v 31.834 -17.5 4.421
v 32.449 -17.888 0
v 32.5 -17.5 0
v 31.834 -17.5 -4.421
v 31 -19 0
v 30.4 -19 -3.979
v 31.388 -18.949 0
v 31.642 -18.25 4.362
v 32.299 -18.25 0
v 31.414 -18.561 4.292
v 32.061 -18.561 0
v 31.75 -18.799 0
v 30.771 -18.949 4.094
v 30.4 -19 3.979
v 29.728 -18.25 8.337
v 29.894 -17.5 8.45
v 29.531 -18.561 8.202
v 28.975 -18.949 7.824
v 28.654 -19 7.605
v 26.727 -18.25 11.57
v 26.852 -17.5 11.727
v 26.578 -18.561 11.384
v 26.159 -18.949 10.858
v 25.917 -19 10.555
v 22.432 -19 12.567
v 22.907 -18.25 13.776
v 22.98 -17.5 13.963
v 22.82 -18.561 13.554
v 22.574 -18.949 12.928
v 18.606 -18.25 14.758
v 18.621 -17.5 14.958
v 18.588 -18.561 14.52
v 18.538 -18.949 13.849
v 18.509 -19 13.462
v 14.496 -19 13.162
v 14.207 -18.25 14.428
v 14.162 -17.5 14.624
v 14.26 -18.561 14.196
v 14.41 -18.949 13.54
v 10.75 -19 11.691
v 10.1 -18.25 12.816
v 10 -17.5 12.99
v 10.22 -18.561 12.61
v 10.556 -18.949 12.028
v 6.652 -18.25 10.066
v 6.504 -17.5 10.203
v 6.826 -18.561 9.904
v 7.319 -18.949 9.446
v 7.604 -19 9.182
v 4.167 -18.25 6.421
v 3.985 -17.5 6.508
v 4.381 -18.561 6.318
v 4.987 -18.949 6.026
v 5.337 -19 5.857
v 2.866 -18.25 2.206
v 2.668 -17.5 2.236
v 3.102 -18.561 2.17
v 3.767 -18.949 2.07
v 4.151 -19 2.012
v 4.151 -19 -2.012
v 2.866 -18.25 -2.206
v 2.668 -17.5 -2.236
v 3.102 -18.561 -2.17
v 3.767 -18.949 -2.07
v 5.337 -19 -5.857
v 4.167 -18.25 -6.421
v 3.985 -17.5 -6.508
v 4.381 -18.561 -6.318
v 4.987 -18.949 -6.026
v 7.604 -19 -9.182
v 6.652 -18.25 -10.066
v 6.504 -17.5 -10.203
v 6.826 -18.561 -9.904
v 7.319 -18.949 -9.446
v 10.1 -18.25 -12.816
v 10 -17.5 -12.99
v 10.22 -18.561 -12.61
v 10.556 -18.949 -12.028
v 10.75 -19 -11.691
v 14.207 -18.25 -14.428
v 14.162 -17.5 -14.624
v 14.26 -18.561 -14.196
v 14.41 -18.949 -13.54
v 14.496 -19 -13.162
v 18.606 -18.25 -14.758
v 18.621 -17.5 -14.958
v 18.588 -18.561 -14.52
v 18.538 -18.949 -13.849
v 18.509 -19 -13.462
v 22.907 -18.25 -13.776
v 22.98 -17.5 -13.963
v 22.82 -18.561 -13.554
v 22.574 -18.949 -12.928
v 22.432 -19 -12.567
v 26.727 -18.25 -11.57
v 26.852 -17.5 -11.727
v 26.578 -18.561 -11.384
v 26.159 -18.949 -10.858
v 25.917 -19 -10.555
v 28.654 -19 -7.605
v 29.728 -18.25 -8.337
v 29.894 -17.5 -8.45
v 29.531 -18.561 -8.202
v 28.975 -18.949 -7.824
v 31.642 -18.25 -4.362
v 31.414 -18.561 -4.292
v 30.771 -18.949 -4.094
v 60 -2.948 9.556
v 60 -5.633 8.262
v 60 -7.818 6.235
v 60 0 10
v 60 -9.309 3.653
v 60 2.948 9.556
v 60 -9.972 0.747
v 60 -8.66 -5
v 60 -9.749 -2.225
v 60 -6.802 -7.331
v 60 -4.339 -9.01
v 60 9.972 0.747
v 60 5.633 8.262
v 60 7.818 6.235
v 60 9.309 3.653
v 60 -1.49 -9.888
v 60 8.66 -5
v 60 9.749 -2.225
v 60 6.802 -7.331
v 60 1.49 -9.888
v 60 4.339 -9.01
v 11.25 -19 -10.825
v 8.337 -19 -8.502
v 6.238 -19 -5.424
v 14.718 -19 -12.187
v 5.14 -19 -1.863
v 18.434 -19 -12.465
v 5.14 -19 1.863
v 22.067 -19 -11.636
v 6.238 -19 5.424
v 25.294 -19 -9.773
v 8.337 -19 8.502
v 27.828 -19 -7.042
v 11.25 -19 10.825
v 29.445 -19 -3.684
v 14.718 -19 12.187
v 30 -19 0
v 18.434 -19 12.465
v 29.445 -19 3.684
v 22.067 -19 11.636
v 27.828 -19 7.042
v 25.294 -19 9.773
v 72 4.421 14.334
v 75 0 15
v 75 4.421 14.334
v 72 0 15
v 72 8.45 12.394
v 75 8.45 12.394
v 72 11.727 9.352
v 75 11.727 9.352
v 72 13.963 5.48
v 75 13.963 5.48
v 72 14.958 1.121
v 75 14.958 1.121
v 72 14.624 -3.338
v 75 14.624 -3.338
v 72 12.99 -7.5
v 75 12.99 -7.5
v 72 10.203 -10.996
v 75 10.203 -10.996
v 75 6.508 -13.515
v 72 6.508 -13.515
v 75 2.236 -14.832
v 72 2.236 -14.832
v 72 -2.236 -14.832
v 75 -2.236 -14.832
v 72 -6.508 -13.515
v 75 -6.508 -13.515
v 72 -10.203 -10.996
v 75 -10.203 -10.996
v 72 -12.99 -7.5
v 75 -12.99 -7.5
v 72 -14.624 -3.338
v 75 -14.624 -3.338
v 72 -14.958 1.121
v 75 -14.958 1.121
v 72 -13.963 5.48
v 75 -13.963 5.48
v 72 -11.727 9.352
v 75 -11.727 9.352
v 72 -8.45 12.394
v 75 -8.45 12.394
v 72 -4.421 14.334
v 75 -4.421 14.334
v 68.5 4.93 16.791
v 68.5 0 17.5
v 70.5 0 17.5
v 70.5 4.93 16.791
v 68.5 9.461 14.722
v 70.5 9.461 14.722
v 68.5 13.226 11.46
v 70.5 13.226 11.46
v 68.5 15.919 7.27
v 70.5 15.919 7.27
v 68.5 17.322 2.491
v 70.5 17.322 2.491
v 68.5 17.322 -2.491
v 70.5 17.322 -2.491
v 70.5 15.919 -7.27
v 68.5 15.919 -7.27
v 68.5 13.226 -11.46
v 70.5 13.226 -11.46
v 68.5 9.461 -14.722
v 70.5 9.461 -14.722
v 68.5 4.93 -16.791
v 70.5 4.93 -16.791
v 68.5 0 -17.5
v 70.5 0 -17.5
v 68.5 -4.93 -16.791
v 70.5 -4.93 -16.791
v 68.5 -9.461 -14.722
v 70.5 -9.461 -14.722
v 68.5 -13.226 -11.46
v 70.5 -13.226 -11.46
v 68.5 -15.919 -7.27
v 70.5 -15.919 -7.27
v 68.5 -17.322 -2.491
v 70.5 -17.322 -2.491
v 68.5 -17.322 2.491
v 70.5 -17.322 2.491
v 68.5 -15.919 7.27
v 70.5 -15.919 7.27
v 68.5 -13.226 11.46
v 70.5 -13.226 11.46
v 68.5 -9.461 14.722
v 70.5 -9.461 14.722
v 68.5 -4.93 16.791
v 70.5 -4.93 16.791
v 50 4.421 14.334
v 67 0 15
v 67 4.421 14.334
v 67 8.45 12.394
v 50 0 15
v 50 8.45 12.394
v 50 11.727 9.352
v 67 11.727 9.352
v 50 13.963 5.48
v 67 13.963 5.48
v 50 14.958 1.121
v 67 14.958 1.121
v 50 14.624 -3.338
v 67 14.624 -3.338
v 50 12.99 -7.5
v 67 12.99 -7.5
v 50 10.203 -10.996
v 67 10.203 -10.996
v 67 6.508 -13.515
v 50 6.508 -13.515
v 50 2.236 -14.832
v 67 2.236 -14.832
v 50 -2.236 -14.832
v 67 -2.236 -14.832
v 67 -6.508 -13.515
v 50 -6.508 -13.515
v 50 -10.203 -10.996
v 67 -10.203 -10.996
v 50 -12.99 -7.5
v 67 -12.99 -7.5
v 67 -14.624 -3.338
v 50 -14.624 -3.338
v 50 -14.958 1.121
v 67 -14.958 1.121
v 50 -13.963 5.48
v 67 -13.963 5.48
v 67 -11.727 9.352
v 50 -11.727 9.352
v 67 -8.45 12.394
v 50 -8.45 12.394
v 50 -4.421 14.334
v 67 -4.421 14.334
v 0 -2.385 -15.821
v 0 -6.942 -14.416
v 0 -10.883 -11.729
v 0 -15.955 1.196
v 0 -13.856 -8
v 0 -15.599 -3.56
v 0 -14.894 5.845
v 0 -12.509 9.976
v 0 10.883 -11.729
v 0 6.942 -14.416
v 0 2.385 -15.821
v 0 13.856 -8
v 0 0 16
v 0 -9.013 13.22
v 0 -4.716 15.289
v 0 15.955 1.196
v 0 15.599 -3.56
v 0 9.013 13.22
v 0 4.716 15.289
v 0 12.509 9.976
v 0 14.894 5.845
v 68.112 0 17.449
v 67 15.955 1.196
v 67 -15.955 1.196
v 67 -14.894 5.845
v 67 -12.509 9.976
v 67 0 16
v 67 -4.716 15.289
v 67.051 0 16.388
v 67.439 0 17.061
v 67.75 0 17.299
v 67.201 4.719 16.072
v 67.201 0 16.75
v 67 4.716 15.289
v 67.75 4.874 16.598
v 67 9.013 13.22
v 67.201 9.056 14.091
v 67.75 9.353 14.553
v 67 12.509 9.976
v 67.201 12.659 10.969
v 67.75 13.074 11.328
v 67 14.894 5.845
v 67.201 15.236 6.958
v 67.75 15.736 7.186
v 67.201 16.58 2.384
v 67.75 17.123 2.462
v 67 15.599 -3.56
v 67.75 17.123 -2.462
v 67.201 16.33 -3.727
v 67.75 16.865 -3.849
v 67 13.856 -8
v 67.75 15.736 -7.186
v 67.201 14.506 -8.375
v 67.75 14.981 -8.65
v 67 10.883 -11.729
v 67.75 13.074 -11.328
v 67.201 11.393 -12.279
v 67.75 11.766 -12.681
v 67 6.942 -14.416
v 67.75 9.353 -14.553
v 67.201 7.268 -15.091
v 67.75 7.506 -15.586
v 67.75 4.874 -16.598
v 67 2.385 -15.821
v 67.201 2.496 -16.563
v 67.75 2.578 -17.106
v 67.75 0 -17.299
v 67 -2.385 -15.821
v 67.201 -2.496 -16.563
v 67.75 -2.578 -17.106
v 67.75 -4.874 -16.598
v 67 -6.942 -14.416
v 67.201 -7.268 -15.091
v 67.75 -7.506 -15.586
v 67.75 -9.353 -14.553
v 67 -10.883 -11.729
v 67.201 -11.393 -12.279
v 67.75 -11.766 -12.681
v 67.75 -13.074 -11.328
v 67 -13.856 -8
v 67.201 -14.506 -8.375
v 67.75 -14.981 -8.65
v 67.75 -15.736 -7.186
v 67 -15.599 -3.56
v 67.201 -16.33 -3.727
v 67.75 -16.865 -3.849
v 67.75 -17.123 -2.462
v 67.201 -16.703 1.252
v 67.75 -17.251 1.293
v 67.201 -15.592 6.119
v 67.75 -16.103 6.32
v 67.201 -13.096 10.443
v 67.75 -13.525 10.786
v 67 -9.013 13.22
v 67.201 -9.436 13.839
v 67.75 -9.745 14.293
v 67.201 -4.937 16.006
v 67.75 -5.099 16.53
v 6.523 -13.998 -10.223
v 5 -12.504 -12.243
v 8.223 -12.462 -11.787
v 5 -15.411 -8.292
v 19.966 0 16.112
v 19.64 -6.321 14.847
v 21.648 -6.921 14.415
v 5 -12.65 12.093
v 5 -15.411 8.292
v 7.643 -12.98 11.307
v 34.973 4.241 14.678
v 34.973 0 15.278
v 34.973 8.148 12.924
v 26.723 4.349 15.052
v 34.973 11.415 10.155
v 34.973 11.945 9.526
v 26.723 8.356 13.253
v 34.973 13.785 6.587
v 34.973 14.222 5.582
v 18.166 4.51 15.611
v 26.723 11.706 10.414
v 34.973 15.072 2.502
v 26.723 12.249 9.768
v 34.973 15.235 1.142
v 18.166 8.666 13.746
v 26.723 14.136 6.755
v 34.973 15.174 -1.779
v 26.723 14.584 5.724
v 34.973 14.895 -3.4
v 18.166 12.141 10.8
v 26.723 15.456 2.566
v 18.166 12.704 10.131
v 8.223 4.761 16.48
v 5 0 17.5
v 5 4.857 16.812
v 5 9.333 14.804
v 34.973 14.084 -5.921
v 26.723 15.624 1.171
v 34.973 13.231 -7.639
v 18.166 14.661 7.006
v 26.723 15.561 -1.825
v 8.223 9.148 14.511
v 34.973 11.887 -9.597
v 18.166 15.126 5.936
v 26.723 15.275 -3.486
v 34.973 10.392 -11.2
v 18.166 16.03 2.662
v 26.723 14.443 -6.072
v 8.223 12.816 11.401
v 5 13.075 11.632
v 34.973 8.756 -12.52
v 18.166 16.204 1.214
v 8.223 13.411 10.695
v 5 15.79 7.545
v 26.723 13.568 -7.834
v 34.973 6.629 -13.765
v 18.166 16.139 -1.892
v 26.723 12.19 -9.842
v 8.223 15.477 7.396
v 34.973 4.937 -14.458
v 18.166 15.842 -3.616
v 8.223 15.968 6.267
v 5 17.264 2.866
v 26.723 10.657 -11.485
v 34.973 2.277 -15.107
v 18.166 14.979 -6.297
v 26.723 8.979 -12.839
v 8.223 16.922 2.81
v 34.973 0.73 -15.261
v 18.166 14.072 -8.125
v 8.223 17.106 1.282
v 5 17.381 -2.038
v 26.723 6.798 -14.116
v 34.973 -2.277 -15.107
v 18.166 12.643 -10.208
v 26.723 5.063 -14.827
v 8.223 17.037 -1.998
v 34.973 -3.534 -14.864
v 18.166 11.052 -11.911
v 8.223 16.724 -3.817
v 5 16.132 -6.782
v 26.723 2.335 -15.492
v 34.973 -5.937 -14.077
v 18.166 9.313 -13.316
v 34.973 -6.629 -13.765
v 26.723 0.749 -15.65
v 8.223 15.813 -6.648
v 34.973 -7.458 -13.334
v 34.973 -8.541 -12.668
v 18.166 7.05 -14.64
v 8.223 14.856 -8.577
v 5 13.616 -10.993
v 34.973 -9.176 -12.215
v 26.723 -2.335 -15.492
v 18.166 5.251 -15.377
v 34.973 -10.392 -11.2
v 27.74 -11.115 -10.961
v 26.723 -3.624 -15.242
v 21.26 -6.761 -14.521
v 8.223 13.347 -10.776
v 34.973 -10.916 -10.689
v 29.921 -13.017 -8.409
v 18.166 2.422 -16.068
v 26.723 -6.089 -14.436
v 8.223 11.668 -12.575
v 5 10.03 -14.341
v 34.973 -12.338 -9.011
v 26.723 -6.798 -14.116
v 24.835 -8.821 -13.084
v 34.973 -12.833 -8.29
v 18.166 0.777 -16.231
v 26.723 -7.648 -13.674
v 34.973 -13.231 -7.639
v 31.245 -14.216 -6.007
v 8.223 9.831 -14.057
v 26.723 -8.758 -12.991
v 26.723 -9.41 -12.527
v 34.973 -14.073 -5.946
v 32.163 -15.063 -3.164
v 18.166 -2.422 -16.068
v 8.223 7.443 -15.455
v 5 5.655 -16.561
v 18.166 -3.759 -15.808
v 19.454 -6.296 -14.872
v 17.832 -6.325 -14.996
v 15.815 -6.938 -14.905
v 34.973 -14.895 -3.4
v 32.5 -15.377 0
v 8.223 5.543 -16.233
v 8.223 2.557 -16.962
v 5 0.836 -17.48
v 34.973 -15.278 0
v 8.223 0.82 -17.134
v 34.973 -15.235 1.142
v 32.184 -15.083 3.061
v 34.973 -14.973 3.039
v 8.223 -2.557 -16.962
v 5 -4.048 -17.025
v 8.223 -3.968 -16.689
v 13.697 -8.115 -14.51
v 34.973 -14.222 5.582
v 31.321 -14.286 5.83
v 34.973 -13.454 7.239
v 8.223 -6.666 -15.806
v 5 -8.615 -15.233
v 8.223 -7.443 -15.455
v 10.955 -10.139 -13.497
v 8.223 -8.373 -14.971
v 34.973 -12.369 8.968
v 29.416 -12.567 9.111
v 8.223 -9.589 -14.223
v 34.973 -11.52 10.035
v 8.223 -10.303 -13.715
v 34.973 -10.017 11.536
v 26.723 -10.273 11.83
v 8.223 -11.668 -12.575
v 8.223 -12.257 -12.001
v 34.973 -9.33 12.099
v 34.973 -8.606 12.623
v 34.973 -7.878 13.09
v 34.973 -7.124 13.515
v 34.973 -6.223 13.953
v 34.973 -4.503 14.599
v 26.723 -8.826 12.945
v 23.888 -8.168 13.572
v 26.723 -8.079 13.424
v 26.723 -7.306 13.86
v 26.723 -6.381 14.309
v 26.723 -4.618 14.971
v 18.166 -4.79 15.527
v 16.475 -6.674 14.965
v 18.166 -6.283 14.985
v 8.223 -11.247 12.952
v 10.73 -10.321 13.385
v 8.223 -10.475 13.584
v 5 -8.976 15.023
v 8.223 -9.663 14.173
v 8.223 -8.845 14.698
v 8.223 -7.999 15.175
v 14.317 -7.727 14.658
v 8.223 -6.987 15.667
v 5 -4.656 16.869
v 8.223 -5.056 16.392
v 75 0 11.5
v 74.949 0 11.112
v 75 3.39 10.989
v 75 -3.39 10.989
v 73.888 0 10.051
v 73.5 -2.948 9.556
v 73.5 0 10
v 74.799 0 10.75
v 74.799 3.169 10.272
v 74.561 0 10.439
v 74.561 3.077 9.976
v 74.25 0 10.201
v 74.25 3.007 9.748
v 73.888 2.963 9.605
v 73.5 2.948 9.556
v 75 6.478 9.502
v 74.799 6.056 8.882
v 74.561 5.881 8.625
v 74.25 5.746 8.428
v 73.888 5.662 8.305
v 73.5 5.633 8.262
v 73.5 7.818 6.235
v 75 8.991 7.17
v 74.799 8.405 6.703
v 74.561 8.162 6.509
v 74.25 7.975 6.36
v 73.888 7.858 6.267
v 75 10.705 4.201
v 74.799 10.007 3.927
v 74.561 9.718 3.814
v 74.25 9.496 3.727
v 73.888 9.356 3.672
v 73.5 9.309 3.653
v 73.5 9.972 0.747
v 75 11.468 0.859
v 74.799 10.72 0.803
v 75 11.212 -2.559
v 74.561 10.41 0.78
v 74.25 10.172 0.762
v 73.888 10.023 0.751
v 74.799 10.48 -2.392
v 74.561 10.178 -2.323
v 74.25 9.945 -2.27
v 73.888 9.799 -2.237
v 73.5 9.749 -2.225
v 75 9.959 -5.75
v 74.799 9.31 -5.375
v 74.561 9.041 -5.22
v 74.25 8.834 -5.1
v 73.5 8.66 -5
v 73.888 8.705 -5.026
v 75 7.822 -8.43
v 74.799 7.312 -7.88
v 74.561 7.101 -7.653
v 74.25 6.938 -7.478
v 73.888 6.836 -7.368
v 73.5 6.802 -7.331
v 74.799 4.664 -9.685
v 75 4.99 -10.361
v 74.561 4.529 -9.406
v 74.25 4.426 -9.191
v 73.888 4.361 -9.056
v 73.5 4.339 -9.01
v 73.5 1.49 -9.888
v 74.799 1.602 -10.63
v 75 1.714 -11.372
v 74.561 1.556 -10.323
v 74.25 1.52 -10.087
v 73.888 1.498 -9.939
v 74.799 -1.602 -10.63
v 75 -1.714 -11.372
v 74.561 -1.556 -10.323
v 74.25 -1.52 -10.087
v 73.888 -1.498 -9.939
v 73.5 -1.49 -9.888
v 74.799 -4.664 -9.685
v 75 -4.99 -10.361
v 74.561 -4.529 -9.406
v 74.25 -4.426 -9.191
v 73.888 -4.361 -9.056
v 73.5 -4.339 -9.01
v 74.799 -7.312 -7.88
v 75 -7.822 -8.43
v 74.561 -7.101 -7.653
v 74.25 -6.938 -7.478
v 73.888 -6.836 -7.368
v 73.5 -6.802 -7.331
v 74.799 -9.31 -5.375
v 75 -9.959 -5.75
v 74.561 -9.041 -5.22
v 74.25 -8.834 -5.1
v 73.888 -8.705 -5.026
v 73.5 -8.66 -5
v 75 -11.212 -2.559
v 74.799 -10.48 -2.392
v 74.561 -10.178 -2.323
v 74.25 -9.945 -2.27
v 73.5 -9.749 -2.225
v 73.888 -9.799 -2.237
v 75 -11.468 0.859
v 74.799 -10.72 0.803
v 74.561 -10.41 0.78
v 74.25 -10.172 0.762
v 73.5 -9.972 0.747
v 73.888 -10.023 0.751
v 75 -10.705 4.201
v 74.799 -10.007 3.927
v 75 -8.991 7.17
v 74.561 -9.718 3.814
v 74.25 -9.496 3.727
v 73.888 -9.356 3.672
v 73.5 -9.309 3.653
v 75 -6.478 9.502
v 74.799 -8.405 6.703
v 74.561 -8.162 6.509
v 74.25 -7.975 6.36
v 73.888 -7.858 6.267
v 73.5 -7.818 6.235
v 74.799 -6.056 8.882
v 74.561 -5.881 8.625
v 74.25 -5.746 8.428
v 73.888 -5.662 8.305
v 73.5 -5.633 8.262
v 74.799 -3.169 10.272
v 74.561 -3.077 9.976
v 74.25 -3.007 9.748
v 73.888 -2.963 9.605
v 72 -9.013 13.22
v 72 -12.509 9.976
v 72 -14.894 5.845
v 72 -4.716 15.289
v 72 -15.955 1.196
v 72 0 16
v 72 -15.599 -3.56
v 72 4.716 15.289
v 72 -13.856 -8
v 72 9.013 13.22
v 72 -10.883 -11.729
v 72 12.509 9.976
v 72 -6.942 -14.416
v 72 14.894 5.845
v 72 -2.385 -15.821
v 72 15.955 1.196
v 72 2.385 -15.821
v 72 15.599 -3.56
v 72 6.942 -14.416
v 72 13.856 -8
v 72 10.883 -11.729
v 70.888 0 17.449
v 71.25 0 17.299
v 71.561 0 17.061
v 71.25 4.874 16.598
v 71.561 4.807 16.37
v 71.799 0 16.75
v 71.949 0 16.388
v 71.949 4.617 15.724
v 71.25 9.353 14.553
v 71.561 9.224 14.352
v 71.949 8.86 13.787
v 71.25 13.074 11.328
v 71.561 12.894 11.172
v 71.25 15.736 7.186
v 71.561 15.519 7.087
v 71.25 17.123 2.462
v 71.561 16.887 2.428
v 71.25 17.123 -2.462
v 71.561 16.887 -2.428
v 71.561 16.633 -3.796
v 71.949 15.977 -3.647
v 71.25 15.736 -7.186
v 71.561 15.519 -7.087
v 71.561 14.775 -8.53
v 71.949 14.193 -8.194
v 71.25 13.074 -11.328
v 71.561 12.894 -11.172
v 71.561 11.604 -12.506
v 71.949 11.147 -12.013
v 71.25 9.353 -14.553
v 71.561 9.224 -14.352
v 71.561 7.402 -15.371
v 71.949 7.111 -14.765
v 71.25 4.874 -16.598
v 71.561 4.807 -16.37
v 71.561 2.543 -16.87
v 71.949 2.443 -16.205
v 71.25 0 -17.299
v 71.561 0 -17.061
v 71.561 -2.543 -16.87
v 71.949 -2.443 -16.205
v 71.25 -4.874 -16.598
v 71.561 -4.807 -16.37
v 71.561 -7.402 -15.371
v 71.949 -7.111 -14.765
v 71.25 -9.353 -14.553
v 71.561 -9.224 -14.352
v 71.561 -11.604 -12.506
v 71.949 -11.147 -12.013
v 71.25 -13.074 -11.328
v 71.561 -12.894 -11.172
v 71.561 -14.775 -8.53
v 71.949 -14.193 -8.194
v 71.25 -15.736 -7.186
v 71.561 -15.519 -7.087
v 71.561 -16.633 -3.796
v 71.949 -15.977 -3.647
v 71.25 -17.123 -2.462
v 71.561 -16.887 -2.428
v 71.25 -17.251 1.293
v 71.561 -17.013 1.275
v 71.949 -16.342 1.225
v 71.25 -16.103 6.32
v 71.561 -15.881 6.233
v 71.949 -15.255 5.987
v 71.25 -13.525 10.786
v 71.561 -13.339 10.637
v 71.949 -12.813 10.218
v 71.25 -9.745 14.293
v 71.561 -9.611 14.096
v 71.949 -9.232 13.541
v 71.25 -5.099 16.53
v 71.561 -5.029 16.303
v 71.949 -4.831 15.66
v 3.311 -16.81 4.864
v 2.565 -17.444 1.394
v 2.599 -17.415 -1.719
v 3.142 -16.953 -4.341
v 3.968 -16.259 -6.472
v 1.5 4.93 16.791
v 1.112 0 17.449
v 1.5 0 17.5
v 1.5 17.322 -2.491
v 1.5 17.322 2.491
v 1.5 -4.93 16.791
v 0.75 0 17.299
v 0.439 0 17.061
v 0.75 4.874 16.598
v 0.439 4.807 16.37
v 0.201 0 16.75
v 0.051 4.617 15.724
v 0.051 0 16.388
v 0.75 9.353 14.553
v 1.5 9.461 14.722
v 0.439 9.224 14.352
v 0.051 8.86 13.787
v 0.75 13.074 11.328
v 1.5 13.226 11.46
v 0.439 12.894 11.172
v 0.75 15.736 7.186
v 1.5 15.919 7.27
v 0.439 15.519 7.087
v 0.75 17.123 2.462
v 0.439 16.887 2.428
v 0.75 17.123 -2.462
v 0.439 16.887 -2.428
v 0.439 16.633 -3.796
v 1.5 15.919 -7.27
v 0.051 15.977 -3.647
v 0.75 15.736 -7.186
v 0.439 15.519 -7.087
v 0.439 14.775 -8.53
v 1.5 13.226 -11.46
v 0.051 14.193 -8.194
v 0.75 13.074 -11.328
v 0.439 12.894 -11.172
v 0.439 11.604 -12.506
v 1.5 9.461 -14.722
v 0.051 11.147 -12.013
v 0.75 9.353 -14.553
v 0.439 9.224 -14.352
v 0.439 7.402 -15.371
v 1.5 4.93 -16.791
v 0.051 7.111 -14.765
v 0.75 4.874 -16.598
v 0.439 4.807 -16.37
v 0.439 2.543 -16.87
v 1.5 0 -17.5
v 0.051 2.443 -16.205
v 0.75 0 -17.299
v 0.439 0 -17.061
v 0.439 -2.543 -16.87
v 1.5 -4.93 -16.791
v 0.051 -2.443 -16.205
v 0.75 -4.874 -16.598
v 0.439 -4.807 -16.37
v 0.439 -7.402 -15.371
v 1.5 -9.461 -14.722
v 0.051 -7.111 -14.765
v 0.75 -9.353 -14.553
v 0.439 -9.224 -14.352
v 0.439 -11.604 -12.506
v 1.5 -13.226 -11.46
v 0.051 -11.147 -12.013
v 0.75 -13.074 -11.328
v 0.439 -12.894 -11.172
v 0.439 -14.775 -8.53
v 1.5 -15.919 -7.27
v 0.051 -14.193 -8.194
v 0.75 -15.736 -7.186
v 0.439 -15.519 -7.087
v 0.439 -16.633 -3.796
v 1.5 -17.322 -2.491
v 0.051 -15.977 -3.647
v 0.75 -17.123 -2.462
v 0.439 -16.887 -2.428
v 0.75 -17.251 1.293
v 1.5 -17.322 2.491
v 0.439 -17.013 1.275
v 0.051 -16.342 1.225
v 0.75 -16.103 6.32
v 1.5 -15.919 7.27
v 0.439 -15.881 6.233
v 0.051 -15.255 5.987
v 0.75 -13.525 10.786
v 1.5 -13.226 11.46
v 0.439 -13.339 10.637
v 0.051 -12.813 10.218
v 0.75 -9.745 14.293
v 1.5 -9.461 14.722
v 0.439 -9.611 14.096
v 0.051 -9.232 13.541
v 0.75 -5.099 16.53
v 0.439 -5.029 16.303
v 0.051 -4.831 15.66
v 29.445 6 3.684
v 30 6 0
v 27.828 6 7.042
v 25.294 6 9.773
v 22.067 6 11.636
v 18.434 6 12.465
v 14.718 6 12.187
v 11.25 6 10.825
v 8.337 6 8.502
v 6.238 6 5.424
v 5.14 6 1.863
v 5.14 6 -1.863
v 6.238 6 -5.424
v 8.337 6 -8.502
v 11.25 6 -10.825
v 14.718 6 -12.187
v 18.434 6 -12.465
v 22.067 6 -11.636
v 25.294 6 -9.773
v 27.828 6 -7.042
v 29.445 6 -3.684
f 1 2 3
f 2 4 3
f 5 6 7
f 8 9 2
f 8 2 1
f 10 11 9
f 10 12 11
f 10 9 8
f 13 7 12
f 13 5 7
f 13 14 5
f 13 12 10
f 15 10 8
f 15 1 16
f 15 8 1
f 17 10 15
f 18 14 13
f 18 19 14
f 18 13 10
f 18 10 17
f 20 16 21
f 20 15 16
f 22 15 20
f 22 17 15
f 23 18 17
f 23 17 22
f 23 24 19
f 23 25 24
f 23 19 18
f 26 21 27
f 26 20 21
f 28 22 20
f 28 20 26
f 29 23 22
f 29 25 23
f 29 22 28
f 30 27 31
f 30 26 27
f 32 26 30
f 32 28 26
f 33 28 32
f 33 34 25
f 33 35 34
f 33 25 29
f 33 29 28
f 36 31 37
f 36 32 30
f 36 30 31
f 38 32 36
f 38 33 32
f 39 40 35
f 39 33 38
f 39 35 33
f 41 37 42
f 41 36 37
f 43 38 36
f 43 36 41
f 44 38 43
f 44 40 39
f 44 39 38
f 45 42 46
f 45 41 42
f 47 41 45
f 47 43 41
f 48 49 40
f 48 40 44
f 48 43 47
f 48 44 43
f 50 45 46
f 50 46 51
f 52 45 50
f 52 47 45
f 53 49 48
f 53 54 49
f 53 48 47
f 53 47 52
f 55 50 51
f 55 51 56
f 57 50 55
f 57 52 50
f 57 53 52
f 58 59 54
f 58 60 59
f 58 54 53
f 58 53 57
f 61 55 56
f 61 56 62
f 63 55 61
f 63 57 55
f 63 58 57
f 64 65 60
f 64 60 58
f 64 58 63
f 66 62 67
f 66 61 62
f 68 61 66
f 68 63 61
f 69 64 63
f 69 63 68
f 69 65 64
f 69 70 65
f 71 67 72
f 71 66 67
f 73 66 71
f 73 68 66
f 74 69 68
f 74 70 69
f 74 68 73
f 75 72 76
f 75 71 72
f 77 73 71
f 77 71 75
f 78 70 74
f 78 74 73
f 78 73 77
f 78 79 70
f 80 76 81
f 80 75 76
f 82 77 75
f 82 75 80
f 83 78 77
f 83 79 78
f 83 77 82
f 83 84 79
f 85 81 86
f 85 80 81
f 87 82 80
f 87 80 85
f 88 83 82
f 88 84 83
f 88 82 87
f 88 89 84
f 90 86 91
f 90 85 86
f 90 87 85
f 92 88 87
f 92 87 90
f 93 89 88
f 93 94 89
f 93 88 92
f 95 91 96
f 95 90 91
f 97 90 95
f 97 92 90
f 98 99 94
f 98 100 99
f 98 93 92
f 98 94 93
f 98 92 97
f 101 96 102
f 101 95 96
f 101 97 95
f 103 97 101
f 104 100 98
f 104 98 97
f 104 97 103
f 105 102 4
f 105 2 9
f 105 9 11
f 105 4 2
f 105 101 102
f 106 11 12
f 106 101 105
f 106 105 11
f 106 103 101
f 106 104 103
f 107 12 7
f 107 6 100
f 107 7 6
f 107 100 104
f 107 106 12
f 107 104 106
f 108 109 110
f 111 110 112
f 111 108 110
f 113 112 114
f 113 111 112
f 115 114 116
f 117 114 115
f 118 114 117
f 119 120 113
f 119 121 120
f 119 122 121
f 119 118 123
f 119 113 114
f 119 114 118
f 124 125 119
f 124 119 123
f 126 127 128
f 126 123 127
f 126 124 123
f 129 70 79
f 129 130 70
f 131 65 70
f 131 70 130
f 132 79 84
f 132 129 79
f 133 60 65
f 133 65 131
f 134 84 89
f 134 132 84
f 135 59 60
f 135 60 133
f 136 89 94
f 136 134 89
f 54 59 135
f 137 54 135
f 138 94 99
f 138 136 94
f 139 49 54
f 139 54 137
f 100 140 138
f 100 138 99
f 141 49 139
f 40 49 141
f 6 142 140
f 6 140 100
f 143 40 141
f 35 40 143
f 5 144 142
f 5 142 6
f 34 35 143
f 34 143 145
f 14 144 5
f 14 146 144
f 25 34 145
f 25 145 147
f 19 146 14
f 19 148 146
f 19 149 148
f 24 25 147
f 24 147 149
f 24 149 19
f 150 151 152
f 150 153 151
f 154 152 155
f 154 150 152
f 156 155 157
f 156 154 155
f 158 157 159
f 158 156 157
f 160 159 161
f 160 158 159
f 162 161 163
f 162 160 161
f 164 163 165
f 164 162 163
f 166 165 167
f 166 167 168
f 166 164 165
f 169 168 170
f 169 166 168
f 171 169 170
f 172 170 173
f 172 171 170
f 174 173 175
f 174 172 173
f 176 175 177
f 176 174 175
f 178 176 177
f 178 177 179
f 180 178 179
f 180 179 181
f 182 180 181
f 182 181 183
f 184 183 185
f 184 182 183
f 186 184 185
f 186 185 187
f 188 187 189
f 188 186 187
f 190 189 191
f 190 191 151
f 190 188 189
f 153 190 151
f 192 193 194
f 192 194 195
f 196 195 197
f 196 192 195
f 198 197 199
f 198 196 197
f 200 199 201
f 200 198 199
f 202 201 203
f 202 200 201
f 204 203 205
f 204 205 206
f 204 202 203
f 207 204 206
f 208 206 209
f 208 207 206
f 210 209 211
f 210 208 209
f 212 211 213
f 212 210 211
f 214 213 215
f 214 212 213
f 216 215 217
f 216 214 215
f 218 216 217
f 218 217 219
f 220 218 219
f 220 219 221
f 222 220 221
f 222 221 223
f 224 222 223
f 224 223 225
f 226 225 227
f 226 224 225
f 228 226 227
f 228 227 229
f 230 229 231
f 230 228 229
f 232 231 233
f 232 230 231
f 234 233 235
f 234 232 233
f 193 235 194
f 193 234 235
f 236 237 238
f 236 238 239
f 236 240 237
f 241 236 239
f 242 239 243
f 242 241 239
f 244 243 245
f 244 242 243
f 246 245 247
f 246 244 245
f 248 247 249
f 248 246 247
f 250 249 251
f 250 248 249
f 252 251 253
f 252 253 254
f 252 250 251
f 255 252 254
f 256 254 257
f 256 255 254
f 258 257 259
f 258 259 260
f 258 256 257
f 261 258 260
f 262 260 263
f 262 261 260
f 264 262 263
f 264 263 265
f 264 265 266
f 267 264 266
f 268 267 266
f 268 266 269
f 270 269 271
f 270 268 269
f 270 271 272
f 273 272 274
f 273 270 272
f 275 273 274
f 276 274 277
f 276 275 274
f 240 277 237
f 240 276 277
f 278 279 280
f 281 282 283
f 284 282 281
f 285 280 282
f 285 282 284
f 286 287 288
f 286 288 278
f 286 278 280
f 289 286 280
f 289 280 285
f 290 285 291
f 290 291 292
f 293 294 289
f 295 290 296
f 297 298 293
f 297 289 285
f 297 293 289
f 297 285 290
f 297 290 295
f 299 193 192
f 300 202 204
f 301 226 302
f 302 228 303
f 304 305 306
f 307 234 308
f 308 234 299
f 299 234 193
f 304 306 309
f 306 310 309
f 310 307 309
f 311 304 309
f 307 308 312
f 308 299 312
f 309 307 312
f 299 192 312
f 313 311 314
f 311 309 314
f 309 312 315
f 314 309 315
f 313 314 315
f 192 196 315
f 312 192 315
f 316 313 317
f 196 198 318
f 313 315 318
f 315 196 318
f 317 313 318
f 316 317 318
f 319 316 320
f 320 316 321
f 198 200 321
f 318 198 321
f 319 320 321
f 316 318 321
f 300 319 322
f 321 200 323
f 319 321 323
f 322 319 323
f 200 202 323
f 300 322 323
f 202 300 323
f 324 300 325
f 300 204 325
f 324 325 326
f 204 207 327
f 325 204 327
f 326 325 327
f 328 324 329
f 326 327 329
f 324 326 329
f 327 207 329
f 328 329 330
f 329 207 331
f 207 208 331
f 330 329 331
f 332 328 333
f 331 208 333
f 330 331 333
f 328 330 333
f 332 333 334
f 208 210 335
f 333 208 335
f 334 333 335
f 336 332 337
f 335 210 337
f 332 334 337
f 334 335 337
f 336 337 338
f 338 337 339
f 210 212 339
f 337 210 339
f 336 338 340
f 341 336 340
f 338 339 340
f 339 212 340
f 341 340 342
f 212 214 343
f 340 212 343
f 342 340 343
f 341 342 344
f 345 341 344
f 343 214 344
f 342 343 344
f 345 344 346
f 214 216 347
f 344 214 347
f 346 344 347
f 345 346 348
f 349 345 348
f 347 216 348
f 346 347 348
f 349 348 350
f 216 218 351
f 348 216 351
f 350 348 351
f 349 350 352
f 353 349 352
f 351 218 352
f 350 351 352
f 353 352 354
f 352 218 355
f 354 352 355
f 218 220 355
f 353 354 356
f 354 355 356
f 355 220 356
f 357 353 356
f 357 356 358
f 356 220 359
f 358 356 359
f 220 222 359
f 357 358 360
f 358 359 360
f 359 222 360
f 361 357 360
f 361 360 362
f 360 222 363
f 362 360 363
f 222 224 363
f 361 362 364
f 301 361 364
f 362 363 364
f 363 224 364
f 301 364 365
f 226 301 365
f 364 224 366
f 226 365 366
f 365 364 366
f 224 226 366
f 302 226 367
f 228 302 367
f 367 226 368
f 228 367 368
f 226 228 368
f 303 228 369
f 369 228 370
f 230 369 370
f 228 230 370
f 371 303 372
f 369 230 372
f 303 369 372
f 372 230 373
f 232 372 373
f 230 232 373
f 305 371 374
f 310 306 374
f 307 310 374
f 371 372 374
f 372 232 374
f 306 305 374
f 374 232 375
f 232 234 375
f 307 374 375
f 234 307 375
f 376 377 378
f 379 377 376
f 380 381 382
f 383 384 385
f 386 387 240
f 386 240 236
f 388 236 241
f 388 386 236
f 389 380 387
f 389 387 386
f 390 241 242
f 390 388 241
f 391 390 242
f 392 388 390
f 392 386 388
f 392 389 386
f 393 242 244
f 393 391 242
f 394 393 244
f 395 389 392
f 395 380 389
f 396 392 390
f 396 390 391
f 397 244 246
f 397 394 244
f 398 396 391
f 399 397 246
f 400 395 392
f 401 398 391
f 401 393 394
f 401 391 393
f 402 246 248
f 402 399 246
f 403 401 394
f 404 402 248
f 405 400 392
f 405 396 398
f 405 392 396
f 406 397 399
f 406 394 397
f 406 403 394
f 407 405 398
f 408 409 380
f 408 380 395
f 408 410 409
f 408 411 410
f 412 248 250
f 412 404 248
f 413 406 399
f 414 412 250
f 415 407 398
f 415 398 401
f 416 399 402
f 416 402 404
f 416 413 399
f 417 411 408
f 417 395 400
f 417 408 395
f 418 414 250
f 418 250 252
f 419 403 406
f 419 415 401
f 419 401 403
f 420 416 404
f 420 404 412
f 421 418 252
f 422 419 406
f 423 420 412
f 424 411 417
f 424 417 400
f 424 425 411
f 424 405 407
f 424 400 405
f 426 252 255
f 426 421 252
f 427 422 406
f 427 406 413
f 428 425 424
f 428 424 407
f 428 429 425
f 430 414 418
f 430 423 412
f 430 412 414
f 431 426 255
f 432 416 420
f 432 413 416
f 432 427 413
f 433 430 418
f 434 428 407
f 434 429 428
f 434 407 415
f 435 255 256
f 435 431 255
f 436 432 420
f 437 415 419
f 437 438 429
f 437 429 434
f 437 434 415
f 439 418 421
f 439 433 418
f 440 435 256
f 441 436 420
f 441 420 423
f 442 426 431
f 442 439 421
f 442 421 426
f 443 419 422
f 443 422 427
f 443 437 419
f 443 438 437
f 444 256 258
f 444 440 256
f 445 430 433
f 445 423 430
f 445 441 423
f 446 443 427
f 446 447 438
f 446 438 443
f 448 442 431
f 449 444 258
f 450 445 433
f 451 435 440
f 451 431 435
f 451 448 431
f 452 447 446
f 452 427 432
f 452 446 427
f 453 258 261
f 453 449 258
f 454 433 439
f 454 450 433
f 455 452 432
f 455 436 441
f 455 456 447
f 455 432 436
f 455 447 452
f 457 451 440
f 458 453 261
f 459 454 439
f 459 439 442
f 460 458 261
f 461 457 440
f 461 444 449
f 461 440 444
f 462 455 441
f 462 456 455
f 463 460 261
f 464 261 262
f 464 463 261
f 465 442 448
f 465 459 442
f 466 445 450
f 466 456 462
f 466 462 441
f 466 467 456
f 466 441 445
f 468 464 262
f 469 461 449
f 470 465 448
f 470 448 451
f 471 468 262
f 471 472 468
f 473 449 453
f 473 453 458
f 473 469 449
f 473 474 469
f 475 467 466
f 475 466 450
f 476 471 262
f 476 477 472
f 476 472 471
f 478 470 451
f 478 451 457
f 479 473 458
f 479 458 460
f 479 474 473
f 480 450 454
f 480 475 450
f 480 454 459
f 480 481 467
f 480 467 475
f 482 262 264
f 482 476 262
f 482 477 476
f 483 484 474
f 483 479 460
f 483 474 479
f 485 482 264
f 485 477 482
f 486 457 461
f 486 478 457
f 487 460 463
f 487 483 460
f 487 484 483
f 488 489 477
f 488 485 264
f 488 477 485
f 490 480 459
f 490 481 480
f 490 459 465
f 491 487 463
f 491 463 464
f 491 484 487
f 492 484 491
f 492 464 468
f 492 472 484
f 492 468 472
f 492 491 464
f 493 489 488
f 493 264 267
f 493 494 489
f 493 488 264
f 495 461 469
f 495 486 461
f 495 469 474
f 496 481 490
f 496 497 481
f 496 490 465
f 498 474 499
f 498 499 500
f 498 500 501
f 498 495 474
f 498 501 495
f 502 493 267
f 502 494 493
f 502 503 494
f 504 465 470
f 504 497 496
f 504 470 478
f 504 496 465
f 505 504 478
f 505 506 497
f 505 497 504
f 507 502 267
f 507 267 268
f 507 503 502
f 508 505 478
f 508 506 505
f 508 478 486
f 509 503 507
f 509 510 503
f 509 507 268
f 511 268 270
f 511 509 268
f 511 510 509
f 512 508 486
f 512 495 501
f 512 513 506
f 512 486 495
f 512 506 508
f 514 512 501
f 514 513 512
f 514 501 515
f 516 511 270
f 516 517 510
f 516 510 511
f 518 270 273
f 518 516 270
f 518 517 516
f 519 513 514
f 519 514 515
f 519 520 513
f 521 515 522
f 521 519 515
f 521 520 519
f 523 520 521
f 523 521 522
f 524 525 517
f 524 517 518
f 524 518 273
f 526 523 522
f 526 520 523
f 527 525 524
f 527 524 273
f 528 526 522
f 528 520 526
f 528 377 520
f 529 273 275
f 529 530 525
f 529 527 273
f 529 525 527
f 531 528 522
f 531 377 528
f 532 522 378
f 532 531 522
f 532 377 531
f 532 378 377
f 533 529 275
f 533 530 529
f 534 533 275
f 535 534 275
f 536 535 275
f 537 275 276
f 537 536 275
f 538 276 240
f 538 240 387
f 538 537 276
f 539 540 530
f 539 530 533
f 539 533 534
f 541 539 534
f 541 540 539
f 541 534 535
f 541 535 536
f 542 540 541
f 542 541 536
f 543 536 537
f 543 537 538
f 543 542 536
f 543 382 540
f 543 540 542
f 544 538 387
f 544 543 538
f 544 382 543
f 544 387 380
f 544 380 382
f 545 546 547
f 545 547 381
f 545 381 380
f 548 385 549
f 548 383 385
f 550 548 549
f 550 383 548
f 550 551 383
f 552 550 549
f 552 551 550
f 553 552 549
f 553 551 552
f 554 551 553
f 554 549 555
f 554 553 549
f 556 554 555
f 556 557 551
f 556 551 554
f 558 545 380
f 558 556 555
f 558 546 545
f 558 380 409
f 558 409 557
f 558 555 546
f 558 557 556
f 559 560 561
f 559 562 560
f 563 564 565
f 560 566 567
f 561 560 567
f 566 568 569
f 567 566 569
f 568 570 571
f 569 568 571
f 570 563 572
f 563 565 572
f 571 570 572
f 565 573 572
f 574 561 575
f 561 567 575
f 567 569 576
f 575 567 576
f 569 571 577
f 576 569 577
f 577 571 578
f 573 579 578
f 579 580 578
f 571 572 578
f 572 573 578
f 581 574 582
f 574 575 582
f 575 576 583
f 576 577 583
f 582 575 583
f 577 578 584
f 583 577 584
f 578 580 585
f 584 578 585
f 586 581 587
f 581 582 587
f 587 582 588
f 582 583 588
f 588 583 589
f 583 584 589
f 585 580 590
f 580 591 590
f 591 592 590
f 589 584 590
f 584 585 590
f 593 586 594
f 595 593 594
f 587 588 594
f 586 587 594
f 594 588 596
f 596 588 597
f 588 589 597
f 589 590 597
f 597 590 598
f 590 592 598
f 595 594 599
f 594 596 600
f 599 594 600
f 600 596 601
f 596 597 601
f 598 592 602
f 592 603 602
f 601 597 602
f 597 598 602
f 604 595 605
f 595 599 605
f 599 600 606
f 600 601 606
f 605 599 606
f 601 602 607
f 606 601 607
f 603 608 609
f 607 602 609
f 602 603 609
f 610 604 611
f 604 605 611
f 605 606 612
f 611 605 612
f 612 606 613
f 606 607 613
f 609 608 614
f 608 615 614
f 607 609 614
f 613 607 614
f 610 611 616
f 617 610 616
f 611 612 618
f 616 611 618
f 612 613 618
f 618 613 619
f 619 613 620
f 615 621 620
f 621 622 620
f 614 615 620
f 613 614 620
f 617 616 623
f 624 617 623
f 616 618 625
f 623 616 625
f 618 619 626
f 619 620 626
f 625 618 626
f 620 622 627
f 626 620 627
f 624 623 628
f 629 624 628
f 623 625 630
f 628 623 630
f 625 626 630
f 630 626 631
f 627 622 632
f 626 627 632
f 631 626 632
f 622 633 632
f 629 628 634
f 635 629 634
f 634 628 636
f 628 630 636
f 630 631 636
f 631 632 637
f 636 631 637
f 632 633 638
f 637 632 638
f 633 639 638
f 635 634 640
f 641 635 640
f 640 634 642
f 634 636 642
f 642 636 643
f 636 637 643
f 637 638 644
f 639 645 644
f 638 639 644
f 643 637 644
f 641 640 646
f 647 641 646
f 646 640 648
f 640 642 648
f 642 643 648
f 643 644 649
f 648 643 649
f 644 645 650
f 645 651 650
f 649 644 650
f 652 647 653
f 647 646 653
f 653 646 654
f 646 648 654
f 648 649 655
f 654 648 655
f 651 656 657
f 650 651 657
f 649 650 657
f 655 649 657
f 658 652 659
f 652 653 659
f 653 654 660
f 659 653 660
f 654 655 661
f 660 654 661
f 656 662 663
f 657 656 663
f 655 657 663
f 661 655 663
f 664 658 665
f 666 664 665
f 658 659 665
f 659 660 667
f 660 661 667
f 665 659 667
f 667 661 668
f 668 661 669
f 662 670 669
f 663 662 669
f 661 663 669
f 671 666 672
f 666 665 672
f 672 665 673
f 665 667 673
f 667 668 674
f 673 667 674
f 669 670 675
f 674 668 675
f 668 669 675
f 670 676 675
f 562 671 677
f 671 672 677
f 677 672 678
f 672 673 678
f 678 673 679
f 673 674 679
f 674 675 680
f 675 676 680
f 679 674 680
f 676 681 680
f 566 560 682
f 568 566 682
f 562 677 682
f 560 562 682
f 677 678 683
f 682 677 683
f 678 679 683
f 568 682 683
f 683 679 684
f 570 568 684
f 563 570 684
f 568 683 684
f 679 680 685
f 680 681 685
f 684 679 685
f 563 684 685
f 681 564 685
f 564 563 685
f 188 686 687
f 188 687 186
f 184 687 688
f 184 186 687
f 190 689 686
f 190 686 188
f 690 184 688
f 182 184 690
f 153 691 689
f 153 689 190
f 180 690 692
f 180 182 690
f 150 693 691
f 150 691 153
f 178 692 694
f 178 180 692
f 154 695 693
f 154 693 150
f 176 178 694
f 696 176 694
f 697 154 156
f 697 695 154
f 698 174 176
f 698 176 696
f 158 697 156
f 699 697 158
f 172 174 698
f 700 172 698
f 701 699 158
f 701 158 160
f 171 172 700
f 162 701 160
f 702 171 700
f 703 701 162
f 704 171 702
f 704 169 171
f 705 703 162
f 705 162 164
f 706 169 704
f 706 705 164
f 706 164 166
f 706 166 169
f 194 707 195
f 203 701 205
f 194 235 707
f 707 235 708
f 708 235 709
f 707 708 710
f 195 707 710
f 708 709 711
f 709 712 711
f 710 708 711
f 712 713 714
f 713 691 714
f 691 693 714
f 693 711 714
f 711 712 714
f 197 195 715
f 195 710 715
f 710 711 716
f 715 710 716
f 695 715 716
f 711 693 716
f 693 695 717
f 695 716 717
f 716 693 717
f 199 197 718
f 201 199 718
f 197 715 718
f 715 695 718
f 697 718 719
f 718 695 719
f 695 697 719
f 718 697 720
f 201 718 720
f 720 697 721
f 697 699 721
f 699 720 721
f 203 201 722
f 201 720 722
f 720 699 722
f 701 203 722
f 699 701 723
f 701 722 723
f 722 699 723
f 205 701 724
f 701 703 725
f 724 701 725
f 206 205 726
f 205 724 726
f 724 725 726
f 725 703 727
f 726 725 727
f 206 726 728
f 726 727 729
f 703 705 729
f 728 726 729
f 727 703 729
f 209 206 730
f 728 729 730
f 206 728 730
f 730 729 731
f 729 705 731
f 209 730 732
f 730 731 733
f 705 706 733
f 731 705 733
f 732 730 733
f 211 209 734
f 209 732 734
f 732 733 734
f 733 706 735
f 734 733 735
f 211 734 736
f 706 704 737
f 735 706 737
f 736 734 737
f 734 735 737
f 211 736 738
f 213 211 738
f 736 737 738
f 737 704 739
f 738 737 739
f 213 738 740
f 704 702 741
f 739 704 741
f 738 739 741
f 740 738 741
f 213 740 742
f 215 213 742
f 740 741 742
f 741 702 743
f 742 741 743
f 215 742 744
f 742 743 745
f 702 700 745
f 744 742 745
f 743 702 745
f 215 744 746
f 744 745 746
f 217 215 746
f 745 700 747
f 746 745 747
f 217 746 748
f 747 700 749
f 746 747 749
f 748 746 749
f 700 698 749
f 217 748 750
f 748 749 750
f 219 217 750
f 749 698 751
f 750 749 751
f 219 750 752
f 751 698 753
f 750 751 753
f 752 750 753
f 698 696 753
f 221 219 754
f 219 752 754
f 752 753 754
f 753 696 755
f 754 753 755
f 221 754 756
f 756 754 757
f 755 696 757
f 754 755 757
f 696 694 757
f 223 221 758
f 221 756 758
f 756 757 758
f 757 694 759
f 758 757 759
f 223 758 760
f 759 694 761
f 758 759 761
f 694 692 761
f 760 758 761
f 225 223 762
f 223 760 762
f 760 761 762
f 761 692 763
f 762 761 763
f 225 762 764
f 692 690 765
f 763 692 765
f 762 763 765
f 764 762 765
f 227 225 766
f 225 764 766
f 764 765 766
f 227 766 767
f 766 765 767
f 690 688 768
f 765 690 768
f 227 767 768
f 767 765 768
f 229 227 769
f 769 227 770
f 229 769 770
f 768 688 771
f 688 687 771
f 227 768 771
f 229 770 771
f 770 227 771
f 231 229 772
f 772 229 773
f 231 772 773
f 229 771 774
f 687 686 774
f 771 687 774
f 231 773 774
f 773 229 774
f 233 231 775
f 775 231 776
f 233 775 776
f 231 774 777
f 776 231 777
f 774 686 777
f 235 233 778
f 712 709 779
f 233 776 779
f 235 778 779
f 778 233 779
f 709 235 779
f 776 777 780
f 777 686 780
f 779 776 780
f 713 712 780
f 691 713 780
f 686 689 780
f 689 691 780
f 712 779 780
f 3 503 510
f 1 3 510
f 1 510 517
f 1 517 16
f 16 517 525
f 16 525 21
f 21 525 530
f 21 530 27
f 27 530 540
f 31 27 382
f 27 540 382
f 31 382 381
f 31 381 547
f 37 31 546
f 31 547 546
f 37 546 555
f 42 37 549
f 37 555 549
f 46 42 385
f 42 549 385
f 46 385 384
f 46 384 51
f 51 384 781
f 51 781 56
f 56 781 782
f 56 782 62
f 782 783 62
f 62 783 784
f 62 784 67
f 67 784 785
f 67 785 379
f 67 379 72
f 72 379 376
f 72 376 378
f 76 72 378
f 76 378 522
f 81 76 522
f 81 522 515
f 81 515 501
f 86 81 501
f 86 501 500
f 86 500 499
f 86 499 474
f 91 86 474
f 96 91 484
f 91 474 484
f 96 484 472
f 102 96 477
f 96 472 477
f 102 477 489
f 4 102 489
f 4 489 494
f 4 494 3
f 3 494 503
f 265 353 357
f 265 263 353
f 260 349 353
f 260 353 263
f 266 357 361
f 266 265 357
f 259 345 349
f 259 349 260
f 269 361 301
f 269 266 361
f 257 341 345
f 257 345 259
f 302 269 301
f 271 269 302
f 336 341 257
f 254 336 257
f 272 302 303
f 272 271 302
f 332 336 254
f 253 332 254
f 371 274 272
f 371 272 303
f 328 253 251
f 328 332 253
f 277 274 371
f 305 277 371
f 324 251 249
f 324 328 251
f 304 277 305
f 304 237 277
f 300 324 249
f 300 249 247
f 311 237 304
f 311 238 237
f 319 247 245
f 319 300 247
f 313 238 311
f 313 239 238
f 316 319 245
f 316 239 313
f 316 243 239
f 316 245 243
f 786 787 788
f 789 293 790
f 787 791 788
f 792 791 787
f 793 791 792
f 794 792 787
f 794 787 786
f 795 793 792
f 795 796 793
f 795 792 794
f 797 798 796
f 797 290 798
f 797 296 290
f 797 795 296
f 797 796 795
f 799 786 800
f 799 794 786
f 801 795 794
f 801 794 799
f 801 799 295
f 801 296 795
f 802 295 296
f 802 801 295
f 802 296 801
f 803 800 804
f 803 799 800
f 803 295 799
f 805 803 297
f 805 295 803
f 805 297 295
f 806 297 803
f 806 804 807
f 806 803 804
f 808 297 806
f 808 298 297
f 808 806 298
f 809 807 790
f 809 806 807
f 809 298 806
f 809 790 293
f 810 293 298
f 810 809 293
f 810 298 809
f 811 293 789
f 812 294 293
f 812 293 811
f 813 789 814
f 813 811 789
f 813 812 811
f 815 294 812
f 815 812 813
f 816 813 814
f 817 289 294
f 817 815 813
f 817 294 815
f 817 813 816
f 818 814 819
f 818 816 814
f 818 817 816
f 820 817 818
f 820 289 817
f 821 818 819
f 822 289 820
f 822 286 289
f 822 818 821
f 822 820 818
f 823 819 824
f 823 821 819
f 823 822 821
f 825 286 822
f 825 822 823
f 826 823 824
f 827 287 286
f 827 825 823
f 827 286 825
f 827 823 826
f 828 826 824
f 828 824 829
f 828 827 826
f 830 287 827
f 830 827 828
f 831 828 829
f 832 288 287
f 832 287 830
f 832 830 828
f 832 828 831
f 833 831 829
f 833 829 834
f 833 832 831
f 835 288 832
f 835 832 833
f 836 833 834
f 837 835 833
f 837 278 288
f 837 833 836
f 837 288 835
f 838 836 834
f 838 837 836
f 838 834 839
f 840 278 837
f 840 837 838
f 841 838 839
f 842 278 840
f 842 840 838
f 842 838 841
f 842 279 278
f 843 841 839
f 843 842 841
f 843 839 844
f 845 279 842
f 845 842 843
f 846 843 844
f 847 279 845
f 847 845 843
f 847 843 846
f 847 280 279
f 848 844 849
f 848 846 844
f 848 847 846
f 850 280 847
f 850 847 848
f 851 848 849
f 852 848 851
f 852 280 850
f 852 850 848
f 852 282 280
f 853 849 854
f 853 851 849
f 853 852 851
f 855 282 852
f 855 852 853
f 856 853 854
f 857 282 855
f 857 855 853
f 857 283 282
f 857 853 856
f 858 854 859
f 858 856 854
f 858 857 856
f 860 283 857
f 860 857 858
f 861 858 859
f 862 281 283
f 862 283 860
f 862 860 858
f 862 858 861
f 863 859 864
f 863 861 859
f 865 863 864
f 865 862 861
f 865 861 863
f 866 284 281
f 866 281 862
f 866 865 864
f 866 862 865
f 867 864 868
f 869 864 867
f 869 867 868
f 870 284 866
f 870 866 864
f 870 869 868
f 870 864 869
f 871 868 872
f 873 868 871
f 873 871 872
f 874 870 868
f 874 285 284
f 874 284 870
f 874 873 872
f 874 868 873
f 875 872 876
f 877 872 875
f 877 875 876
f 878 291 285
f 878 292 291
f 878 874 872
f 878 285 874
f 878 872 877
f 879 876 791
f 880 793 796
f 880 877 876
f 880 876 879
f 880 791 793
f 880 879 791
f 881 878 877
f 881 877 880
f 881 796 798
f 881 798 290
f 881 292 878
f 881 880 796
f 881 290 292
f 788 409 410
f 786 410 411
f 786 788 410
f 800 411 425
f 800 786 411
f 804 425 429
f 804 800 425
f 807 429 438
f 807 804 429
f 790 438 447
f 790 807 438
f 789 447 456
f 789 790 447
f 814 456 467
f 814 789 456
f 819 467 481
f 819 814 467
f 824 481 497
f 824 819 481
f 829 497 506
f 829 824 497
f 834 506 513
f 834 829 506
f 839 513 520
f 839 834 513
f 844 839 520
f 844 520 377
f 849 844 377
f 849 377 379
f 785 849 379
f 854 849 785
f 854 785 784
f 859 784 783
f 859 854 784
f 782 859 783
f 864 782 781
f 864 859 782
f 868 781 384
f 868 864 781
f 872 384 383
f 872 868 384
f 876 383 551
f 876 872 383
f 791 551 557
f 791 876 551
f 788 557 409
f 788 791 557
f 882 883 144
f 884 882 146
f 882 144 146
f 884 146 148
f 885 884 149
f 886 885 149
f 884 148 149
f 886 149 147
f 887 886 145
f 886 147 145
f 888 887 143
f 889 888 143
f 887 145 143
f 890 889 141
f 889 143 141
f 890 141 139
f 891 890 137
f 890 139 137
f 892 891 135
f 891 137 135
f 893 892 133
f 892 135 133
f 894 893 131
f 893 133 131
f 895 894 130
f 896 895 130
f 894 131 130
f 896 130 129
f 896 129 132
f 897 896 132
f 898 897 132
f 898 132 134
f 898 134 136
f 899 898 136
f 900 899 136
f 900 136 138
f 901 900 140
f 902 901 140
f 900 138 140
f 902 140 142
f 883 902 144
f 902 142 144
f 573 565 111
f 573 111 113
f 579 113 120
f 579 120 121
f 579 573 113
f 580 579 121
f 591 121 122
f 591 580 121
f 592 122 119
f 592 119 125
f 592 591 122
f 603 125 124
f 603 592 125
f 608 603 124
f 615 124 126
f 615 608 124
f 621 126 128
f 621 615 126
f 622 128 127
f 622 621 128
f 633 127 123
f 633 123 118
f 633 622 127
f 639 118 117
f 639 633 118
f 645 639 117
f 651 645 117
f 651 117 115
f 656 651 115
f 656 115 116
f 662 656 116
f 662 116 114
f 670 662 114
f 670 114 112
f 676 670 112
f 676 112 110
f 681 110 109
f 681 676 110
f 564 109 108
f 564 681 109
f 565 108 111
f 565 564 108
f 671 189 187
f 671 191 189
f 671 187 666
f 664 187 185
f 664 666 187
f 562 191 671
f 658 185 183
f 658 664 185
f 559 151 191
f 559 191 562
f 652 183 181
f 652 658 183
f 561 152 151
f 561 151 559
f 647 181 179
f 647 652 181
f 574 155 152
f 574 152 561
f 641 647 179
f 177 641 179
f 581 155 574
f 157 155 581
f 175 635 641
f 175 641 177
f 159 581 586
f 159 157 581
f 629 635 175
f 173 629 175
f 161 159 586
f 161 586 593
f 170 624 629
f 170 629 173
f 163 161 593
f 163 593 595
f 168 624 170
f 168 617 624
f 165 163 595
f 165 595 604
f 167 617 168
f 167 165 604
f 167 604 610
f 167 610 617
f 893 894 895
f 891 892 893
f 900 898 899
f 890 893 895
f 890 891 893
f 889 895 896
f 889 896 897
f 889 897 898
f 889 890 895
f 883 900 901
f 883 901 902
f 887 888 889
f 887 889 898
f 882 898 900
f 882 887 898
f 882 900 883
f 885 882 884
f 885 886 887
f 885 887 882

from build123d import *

# Parameters (mm, degrees)
F2_R     = 15
F3_DEPTH = 19
F4_R     = 12.5
F5_DEPTH = 25
F6_R     = 1.5


with BuildPart() as f1:
    # F0 (on Front) → F1 (revolve)
    with BuildSketch(Plane.XZ):
        with BuildLine():
            Line((0, 17.5), (0, 0))
            Line((0, 0), (60, 0))
            Line((60, 0), (60, 10))
            Line((60, 10), (75, 10))
            Line((75, 10), (75, 15))
            Line((75, 15), (72, 15))
            Line((72, 15), (72, 17.5))
            Line((72, 17.5), (67, 17.5))
            Line((67, 17.5), (67, 15))
            Line((67, 15), (50, 15))
            ThreePointArc((50, 15), (27.465305, 15.625482), (5, 17.5))
            Line((5, 17.5), (0, 17.5))
        make_face()
    revolve(axis=Axis((30, 0, 0), (-1, 0, 0)))

    # F2 (on Front) → F3 (join)
    with BuildSketch(Plane.XZ):
        with Locations((17.5, 0)):
            Circle(F2_R)
    extrude(amount=F3_DEPTH)

    # F4 (on face) → F5 (cut)
    with BuildSketch(Plane.XZ.offset(19)):
        with Locations((17.5, 0)):
            Circle(F4_R)
    extrude(amount=-F5_DEPTH, mode=Mode.SUBTRACT)

    # F6
    f6_edges = [f1.edges().sort_by_distance(p)[0] for p in [
        (2.5, -19, 0),
        (72, 0, -17.5),
        (75, 0, -10),
        (67, 0, -17.5),
        (0, 0, -17.5),
    ]]
    fillet(f6_edges, radius=F6_R)


solid = f1.part
